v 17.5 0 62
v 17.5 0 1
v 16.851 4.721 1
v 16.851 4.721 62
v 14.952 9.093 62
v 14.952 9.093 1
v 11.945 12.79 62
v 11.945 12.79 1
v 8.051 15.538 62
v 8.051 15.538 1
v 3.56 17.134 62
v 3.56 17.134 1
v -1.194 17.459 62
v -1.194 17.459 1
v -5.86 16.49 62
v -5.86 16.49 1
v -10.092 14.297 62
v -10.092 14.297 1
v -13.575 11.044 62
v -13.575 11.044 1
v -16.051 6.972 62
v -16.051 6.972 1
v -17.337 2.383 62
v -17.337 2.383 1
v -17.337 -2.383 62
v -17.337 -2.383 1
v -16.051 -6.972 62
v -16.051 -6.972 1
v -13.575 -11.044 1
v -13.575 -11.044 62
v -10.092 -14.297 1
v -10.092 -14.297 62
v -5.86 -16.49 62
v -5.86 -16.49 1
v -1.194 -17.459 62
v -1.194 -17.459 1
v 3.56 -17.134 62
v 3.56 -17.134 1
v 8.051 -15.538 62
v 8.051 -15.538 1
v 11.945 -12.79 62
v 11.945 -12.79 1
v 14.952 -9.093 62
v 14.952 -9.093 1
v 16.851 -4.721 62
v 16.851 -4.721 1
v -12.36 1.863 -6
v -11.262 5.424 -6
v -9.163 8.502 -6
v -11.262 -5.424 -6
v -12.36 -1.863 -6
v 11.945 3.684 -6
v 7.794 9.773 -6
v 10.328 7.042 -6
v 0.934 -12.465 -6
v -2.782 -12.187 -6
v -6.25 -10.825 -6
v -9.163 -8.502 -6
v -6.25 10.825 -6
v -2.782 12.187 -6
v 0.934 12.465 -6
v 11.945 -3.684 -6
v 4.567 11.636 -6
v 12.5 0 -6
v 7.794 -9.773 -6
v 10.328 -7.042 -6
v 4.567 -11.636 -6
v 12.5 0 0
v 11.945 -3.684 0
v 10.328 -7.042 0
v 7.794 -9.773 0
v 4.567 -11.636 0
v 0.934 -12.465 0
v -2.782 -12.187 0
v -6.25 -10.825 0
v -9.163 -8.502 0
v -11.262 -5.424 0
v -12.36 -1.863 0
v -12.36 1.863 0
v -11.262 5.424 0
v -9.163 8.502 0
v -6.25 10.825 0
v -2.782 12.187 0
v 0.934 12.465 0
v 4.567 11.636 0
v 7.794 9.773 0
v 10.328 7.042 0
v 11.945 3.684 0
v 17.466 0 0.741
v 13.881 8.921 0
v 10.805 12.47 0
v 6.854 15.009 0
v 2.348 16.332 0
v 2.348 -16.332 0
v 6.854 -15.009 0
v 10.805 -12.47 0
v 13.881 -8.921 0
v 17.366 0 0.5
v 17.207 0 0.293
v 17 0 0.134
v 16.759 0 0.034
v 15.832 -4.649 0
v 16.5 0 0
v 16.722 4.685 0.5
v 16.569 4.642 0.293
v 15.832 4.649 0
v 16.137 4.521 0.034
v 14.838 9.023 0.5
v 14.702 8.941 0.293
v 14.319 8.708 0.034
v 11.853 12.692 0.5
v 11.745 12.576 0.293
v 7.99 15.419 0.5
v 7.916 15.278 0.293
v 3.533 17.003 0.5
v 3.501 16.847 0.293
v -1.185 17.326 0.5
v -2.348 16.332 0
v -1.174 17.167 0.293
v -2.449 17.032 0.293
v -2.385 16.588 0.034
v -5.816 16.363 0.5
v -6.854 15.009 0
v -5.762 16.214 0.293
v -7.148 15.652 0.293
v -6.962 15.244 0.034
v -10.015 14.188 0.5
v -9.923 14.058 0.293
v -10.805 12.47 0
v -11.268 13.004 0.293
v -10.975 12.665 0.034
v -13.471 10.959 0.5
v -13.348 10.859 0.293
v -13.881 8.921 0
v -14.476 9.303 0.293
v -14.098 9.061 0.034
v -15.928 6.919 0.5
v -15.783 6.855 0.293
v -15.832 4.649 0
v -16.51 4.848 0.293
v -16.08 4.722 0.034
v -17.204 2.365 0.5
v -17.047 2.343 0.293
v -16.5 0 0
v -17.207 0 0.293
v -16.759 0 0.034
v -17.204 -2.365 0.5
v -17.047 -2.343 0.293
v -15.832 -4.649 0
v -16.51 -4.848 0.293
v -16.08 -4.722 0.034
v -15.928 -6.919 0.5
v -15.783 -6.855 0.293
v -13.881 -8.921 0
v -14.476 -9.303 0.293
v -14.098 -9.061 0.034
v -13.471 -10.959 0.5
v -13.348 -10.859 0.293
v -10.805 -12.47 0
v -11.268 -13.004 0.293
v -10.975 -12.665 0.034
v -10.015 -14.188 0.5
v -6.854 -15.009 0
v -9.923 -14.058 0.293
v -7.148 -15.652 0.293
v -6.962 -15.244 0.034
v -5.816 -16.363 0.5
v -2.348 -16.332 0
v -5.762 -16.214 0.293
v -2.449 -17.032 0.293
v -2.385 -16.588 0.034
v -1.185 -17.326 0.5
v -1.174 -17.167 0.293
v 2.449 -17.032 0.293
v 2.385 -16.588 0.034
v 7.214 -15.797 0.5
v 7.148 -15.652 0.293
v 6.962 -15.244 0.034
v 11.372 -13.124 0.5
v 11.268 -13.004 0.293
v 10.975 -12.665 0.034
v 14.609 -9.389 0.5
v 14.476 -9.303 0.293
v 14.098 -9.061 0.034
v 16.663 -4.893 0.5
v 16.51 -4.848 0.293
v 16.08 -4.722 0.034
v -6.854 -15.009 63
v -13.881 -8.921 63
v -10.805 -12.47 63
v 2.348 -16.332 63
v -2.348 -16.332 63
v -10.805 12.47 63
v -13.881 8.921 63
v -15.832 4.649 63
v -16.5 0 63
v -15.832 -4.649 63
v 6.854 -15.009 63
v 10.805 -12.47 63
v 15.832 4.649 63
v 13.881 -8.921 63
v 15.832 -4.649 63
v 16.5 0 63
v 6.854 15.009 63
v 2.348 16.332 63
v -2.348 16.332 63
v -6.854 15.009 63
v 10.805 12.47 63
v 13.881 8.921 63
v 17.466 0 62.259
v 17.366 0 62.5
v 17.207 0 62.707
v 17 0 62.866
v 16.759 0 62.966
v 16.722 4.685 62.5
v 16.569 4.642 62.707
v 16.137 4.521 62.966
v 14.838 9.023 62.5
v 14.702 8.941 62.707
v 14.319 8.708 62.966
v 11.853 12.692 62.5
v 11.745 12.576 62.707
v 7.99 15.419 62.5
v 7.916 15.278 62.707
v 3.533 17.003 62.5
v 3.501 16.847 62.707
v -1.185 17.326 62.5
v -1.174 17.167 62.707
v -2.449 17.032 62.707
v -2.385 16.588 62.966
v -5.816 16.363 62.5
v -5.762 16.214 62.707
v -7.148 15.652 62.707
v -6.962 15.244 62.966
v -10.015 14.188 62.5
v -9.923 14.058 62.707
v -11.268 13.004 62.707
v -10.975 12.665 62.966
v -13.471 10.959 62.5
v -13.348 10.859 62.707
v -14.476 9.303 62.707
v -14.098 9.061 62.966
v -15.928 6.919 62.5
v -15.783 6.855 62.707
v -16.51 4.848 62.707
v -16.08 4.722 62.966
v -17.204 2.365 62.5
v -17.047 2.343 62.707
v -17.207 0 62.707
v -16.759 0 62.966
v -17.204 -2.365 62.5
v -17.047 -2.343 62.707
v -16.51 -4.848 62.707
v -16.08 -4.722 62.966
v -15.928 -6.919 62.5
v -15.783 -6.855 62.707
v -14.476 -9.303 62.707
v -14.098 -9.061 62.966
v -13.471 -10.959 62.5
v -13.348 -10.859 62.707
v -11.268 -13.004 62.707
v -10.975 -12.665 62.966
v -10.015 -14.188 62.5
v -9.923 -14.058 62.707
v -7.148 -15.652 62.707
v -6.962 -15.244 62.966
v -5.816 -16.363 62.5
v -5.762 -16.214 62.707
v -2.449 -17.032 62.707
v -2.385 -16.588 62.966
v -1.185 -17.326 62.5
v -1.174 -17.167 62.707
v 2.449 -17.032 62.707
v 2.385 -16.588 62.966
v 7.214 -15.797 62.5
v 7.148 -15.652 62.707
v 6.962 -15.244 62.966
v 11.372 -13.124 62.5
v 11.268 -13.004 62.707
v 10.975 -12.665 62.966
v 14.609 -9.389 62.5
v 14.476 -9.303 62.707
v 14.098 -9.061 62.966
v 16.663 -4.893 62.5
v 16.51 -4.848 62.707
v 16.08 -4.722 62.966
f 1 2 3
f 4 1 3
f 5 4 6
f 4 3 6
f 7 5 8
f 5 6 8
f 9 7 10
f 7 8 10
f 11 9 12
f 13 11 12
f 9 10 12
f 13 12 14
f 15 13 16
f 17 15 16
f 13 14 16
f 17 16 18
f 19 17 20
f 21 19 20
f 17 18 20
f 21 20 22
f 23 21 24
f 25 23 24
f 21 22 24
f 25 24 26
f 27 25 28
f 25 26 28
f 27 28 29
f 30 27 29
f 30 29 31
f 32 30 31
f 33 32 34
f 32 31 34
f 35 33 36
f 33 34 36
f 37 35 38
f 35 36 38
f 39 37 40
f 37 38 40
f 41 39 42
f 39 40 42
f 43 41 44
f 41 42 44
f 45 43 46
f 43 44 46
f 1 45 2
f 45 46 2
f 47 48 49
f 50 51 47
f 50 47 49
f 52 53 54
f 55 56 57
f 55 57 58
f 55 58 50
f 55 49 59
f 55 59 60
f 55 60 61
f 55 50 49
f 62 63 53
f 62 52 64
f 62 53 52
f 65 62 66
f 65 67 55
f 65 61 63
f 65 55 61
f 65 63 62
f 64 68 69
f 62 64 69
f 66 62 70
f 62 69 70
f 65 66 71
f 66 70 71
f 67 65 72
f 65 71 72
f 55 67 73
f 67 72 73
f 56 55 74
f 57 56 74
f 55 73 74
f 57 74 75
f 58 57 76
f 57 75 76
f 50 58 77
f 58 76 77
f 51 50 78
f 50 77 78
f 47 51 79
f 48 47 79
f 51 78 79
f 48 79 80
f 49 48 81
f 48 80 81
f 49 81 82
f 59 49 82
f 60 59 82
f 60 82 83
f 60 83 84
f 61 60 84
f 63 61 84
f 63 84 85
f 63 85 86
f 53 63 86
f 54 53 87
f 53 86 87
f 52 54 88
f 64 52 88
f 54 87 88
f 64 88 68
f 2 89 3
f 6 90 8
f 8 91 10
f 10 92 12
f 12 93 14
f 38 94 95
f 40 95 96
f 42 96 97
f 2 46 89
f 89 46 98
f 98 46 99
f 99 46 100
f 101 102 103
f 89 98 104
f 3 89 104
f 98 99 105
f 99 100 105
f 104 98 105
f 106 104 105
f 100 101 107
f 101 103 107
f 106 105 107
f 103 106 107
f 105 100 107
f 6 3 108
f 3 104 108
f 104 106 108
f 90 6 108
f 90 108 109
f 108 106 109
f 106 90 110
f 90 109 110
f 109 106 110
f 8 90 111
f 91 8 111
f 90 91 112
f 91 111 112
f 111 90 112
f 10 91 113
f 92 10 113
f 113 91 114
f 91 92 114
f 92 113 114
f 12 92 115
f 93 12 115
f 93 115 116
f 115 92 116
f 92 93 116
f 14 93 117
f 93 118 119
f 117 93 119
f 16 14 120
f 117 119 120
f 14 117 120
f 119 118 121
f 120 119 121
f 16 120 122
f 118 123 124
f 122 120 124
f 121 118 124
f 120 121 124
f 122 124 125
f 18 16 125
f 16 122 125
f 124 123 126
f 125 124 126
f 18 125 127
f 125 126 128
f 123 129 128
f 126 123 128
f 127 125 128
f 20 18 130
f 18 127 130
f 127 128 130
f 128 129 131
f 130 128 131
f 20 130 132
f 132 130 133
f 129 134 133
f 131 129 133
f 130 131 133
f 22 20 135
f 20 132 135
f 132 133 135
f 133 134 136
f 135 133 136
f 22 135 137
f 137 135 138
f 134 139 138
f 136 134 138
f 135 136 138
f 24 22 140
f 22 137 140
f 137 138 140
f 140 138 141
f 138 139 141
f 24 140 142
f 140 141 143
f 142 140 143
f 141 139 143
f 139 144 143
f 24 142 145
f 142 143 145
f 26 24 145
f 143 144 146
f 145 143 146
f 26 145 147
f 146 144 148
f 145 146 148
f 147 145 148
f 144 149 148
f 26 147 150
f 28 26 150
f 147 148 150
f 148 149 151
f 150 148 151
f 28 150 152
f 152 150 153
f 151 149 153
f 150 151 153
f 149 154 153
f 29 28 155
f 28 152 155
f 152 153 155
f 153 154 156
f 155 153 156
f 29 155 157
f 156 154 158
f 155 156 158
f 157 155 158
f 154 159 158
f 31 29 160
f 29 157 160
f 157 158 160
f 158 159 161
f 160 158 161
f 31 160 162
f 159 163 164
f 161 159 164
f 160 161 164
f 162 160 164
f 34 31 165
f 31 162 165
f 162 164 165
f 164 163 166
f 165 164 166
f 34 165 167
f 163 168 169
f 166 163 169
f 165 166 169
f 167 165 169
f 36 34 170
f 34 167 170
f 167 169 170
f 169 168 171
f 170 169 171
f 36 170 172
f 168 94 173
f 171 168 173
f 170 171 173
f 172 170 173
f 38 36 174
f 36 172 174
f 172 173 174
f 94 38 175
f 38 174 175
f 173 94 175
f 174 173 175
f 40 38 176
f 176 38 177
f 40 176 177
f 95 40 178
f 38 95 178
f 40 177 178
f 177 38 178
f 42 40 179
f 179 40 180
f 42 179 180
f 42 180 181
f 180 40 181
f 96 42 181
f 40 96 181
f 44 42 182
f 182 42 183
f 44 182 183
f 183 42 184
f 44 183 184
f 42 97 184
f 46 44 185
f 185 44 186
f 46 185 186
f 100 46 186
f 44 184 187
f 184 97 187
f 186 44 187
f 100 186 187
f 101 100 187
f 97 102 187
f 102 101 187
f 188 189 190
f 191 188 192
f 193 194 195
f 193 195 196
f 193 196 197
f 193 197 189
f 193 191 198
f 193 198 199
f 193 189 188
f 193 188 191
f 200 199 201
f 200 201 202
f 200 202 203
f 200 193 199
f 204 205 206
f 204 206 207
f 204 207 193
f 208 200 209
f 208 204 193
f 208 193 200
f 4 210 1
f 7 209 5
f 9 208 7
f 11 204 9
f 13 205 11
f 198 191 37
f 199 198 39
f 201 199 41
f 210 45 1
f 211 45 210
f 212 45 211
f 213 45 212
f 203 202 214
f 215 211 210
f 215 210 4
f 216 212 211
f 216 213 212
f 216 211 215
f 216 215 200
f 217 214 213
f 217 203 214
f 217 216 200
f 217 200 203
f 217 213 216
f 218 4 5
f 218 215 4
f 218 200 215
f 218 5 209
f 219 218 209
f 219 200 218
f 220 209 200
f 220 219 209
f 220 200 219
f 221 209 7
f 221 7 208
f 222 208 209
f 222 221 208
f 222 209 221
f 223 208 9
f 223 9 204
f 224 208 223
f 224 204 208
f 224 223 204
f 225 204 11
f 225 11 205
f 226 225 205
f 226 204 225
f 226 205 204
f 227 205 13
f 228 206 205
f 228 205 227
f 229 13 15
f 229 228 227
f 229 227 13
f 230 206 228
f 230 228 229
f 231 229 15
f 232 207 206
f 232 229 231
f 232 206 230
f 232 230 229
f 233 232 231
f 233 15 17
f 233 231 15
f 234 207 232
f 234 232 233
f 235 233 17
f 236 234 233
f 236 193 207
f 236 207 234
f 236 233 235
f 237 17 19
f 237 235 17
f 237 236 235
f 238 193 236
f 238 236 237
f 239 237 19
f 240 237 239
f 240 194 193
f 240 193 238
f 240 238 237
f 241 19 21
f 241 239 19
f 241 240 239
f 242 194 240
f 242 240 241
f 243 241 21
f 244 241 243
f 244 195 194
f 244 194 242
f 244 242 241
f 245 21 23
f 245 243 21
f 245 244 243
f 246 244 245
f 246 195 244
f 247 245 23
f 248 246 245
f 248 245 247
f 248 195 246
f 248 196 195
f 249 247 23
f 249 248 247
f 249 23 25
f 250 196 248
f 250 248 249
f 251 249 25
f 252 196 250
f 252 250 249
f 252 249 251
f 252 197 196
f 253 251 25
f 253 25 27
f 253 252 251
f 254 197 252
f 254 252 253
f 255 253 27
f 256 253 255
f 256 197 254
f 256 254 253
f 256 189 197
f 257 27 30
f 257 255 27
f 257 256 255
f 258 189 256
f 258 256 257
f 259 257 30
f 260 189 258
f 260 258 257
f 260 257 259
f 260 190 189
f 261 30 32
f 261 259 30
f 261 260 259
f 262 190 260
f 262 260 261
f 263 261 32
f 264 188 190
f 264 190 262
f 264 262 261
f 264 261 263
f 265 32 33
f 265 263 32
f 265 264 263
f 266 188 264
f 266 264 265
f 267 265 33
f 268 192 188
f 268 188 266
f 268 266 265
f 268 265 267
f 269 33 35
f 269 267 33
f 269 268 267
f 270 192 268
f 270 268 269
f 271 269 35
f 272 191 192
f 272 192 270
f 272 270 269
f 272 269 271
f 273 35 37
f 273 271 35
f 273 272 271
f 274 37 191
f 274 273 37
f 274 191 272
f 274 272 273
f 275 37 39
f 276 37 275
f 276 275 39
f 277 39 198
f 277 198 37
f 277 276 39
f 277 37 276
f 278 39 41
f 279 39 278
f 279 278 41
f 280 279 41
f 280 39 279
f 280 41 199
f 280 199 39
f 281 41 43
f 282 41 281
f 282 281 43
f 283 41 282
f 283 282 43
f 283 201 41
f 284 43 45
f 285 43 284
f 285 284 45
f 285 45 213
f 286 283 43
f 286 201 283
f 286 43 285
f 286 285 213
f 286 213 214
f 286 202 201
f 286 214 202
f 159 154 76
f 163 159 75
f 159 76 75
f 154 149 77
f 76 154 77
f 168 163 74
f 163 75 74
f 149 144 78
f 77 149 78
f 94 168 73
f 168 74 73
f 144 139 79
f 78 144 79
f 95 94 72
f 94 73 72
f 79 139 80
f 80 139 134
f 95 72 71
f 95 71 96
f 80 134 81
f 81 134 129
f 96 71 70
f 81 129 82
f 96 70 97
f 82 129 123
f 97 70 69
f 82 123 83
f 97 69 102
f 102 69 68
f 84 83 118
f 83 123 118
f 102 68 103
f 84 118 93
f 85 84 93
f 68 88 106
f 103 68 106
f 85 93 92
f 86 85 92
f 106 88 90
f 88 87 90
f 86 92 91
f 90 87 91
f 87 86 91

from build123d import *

# Parameters (mm, degrees)
SKETCH1_R           = 17.5
BOSS_EXTRUDE1_DEPTH = 63
SKETCH2_R           = 12.5
BOSS_EXTRUDE2_DEPTH = 6
FILLET1_R           = 1


with BuildPart() as part:
    # Sketch1 → Boss-Extrude1 (new body)
    with BuildSketch(Plane.XY):
        Circle(SKETCH1_R)
    extrude(amount=BOSS_EXTRUDE1_DEPTH)

    # Sketch2 → Boss-Extrude2 (add)
    with BuildSketch(Plane(origin=(0, 0, 0), x_dir=(-1, 0, 0), z_dir=(0, 0, -1))):
        with Locations(Location((0, 0, 0), (0, 0, 180))):
            Circle(SKETCH2_R)
    extrude(amount=BOSS_EXTRUDE2_DEPTH)

    # Fillet1
    fillet1_edges = [part.edges().sort_by_distance(p)[0] for p in [
        (-17.5, 0, 0),
        (-17.5, 0, 63),
    ]]
    fillet(fillet1_edges, radius=FILLET1_R)


solid = part.part
